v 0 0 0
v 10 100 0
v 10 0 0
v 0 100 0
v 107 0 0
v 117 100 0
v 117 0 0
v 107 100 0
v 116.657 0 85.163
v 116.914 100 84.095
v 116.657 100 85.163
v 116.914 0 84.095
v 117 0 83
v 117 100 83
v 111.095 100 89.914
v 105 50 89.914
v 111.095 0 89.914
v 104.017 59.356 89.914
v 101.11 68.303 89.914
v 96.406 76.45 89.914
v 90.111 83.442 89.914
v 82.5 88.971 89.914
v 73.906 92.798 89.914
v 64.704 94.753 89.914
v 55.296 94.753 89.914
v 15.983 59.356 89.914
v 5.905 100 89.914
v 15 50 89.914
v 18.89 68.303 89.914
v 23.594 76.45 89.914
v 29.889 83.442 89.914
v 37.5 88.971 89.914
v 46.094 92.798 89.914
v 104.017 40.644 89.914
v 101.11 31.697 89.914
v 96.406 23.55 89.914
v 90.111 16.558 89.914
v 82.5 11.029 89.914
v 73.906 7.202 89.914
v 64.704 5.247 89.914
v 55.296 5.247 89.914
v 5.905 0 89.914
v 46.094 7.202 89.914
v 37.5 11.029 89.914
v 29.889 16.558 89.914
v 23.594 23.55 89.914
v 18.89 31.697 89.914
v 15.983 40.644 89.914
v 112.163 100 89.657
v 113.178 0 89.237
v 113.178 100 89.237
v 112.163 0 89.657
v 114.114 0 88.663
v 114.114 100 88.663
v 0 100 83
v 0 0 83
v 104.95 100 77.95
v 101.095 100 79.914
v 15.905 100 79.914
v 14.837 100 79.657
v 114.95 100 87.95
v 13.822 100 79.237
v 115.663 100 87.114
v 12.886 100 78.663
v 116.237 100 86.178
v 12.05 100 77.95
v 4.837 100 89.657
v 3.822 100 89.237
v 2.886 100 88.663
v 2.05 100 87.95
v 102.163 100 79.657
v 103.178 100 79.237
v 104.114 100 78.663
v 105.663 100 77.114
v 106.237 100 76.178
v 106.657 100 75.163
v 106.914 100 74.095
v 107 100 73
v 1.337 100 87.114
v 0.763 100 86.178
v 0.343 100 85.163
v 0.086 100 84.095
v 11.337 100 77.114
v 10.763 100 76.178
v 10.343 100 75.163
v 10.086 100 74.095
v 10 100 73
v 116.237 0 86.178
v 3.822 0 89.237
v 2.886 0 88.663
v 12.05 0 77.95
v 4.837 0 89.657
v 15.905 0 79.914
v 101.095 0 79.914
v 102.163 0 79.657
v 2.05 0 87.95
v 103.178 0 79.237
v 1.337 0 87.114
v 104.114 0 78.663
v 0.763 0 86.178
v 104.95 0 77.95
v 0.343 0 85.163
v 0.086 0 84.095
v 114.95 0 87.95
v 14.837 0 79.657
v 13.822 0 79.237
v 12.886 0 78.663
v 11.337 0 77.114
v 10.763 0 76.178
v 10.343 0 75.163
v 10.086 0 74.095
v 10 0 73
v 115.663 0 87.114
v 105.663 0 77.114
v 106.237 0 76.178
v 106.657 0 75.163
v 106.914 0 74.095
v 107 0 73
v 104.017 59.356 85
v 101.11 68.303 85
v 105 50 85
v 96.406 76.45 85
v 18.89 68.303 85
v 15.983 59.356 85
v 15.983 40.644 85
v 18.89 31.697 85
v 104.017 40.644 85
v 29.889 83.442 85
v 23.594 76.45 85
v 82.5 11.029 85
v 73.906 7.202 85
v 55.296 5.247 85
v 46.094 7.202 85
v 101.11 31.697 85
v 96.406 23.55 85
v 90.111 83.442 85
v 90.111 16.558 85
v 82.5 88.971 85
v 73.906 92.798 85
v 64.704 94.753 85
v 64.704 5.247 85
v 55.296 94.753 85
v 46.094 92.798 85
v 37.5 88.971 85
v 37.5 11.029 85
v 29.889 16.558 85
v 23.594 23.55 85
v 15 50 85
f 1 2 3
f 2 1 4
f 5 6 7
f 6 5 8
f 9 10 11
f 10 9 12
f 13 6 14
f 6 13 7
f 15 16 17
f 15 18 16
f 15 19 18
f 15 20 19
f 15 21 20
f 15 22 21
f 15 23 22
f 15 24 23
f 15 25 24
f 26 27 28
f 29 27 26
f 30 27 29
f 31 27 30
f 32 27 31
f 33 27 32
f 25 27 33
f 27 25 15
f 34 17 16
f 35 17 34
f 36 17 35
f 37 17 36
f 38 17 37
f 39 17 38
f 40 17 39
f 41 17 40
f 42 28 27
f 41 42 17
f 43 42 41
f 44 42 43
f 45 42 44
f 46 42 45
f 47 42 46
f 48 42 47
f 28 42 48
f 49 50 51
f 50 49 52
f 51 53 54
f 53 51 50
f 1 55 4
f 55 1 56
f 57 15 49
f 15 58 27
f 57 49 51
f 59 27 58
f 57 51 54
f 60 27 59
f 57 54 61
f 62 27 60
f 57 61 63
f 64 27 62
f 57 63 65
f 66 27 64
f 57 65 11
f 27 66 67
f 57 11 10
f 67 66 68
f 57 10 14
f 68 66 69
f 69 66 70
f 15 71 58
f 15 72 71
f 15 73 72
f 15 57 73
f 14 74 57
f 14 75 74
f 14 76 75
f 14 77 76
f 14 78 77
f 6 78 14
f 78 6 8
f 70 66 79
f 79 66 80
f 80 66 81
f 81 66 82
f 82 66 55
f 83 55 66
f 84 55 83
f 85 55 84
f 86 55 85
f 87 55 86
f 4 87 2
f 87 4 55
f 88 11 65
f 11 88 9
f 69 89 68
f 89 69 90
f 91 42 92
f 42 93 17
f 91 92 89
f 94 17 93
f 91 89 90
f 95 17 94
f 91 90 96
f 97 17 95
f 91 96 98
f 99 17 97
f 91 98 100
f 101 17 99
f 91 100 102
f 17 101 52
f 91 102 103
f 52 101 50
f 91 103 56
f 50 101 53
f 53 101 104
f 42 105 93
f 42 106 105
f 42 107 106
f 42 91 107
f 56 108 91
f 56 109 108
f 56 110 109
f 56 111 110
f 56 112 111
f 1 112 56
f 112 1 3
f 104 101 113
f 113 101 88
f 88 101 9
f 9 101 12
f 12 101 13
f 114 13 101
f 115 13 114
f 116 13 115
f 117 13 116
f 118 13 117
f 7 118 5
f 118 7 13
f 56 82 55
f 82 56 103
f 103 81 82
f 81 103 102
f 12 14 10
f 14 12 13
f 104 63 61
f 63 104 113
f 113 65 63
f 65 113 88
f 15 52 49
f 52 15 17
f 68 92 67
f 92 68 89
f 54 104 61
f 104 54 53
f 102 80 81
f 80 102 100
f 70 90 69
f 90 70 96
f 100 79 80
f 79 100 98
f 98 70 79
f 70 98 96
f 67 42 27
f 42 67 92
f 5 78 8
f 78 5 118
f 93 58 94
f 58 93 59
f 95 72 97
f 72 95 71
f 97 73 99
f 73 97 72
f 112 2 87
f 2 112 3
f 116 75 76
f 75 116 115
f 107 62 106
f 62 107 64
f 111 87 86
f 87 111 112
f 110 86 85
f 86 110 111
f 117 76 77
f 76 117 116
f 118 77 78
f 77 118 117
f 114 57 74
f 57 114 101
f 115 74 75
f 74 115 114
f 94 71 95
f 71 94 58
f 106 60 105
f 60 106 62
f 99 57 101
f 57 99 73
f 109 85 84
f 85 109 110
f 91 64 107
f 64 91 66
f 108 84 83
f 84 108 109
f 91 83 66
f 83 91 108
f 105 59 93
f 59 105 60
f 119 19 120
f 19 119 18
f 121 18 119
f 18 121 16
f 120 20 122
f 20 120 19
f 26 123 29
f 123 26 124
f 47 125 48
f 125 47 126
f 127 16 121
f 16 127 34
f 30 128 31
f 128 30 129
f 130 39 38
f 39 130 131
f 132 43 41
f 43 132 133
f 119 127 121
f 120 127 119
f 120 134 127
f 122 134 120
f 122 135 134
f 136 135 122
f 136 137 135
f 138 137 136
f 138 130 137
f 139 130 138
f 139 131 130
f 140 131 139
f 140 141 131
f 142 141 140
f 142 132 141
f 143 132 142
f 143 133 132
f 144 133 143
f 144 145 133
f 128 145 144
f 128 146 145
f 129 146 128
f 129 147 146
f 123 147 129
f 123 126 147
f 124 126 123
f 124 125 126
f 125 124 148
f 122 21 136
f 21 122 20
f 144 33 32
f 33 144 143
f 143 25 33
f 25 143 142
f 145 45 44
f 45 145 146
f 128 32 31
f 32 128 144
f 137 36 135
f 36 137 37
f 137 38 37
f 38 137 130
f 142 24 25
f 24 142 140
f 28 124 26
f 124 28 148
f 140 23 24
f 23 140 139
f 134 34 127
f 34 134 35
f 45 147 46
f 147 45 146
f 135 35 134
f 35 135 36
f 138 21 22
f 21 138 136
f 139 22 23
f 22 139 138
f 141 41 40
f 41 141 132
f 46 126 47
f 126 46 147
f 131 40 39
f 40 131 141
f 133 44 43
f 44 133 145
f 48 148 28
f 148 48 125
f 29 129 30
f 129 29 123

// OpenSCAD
chairArmWidth=130;
cupHolderLength=100;
cupHolderHeight=90;
widthOfCupHolder=10;
curveRadius=7;
smoothingAmount=10;
diameterOfCup=90;
module cupHolderBase(){
difference(){
hull(){
for(i=[1:smoothingAmount]){
translate([curveRadius-curveRadius*sin(i*90/smoothingAmount),0,0])cube([(cupHolderHeight+2*widthOfCupHolder-curveRadius+2*curveRadius*sin(i*90/smoothingAmount)),cupHolderLength,(cupHolderHeight-curveRadius+curveRadius*cos(i*90/smoothingAmount))]);
}
}
hull(){
for(i=[1:smoothingAmount]){
translate([widthOfCupHolder+curveRadius-curveRadius*sin(i*90/smoothingAmount),-10,-10])cube([(cupHolderHeight-curveRadius+2*curveRadius*sin(i*90/smoothingAmount)),cupHolderLength+20,(cupHolderHeight-widthOfCupHolder-curveRadius+10+curveRadius*cos(i*90/smoothingAmount))]);
}
}
}
}
difference(){
cupHolderBase();

translate([(chairArmWidth-widthOfCupHolder)/2,cupHolderLength/2,cupHolderHeight-widthOfCupHolder/2])cylinder(r=diameterOfCup/2,h=smoothingAmount/2);
}
